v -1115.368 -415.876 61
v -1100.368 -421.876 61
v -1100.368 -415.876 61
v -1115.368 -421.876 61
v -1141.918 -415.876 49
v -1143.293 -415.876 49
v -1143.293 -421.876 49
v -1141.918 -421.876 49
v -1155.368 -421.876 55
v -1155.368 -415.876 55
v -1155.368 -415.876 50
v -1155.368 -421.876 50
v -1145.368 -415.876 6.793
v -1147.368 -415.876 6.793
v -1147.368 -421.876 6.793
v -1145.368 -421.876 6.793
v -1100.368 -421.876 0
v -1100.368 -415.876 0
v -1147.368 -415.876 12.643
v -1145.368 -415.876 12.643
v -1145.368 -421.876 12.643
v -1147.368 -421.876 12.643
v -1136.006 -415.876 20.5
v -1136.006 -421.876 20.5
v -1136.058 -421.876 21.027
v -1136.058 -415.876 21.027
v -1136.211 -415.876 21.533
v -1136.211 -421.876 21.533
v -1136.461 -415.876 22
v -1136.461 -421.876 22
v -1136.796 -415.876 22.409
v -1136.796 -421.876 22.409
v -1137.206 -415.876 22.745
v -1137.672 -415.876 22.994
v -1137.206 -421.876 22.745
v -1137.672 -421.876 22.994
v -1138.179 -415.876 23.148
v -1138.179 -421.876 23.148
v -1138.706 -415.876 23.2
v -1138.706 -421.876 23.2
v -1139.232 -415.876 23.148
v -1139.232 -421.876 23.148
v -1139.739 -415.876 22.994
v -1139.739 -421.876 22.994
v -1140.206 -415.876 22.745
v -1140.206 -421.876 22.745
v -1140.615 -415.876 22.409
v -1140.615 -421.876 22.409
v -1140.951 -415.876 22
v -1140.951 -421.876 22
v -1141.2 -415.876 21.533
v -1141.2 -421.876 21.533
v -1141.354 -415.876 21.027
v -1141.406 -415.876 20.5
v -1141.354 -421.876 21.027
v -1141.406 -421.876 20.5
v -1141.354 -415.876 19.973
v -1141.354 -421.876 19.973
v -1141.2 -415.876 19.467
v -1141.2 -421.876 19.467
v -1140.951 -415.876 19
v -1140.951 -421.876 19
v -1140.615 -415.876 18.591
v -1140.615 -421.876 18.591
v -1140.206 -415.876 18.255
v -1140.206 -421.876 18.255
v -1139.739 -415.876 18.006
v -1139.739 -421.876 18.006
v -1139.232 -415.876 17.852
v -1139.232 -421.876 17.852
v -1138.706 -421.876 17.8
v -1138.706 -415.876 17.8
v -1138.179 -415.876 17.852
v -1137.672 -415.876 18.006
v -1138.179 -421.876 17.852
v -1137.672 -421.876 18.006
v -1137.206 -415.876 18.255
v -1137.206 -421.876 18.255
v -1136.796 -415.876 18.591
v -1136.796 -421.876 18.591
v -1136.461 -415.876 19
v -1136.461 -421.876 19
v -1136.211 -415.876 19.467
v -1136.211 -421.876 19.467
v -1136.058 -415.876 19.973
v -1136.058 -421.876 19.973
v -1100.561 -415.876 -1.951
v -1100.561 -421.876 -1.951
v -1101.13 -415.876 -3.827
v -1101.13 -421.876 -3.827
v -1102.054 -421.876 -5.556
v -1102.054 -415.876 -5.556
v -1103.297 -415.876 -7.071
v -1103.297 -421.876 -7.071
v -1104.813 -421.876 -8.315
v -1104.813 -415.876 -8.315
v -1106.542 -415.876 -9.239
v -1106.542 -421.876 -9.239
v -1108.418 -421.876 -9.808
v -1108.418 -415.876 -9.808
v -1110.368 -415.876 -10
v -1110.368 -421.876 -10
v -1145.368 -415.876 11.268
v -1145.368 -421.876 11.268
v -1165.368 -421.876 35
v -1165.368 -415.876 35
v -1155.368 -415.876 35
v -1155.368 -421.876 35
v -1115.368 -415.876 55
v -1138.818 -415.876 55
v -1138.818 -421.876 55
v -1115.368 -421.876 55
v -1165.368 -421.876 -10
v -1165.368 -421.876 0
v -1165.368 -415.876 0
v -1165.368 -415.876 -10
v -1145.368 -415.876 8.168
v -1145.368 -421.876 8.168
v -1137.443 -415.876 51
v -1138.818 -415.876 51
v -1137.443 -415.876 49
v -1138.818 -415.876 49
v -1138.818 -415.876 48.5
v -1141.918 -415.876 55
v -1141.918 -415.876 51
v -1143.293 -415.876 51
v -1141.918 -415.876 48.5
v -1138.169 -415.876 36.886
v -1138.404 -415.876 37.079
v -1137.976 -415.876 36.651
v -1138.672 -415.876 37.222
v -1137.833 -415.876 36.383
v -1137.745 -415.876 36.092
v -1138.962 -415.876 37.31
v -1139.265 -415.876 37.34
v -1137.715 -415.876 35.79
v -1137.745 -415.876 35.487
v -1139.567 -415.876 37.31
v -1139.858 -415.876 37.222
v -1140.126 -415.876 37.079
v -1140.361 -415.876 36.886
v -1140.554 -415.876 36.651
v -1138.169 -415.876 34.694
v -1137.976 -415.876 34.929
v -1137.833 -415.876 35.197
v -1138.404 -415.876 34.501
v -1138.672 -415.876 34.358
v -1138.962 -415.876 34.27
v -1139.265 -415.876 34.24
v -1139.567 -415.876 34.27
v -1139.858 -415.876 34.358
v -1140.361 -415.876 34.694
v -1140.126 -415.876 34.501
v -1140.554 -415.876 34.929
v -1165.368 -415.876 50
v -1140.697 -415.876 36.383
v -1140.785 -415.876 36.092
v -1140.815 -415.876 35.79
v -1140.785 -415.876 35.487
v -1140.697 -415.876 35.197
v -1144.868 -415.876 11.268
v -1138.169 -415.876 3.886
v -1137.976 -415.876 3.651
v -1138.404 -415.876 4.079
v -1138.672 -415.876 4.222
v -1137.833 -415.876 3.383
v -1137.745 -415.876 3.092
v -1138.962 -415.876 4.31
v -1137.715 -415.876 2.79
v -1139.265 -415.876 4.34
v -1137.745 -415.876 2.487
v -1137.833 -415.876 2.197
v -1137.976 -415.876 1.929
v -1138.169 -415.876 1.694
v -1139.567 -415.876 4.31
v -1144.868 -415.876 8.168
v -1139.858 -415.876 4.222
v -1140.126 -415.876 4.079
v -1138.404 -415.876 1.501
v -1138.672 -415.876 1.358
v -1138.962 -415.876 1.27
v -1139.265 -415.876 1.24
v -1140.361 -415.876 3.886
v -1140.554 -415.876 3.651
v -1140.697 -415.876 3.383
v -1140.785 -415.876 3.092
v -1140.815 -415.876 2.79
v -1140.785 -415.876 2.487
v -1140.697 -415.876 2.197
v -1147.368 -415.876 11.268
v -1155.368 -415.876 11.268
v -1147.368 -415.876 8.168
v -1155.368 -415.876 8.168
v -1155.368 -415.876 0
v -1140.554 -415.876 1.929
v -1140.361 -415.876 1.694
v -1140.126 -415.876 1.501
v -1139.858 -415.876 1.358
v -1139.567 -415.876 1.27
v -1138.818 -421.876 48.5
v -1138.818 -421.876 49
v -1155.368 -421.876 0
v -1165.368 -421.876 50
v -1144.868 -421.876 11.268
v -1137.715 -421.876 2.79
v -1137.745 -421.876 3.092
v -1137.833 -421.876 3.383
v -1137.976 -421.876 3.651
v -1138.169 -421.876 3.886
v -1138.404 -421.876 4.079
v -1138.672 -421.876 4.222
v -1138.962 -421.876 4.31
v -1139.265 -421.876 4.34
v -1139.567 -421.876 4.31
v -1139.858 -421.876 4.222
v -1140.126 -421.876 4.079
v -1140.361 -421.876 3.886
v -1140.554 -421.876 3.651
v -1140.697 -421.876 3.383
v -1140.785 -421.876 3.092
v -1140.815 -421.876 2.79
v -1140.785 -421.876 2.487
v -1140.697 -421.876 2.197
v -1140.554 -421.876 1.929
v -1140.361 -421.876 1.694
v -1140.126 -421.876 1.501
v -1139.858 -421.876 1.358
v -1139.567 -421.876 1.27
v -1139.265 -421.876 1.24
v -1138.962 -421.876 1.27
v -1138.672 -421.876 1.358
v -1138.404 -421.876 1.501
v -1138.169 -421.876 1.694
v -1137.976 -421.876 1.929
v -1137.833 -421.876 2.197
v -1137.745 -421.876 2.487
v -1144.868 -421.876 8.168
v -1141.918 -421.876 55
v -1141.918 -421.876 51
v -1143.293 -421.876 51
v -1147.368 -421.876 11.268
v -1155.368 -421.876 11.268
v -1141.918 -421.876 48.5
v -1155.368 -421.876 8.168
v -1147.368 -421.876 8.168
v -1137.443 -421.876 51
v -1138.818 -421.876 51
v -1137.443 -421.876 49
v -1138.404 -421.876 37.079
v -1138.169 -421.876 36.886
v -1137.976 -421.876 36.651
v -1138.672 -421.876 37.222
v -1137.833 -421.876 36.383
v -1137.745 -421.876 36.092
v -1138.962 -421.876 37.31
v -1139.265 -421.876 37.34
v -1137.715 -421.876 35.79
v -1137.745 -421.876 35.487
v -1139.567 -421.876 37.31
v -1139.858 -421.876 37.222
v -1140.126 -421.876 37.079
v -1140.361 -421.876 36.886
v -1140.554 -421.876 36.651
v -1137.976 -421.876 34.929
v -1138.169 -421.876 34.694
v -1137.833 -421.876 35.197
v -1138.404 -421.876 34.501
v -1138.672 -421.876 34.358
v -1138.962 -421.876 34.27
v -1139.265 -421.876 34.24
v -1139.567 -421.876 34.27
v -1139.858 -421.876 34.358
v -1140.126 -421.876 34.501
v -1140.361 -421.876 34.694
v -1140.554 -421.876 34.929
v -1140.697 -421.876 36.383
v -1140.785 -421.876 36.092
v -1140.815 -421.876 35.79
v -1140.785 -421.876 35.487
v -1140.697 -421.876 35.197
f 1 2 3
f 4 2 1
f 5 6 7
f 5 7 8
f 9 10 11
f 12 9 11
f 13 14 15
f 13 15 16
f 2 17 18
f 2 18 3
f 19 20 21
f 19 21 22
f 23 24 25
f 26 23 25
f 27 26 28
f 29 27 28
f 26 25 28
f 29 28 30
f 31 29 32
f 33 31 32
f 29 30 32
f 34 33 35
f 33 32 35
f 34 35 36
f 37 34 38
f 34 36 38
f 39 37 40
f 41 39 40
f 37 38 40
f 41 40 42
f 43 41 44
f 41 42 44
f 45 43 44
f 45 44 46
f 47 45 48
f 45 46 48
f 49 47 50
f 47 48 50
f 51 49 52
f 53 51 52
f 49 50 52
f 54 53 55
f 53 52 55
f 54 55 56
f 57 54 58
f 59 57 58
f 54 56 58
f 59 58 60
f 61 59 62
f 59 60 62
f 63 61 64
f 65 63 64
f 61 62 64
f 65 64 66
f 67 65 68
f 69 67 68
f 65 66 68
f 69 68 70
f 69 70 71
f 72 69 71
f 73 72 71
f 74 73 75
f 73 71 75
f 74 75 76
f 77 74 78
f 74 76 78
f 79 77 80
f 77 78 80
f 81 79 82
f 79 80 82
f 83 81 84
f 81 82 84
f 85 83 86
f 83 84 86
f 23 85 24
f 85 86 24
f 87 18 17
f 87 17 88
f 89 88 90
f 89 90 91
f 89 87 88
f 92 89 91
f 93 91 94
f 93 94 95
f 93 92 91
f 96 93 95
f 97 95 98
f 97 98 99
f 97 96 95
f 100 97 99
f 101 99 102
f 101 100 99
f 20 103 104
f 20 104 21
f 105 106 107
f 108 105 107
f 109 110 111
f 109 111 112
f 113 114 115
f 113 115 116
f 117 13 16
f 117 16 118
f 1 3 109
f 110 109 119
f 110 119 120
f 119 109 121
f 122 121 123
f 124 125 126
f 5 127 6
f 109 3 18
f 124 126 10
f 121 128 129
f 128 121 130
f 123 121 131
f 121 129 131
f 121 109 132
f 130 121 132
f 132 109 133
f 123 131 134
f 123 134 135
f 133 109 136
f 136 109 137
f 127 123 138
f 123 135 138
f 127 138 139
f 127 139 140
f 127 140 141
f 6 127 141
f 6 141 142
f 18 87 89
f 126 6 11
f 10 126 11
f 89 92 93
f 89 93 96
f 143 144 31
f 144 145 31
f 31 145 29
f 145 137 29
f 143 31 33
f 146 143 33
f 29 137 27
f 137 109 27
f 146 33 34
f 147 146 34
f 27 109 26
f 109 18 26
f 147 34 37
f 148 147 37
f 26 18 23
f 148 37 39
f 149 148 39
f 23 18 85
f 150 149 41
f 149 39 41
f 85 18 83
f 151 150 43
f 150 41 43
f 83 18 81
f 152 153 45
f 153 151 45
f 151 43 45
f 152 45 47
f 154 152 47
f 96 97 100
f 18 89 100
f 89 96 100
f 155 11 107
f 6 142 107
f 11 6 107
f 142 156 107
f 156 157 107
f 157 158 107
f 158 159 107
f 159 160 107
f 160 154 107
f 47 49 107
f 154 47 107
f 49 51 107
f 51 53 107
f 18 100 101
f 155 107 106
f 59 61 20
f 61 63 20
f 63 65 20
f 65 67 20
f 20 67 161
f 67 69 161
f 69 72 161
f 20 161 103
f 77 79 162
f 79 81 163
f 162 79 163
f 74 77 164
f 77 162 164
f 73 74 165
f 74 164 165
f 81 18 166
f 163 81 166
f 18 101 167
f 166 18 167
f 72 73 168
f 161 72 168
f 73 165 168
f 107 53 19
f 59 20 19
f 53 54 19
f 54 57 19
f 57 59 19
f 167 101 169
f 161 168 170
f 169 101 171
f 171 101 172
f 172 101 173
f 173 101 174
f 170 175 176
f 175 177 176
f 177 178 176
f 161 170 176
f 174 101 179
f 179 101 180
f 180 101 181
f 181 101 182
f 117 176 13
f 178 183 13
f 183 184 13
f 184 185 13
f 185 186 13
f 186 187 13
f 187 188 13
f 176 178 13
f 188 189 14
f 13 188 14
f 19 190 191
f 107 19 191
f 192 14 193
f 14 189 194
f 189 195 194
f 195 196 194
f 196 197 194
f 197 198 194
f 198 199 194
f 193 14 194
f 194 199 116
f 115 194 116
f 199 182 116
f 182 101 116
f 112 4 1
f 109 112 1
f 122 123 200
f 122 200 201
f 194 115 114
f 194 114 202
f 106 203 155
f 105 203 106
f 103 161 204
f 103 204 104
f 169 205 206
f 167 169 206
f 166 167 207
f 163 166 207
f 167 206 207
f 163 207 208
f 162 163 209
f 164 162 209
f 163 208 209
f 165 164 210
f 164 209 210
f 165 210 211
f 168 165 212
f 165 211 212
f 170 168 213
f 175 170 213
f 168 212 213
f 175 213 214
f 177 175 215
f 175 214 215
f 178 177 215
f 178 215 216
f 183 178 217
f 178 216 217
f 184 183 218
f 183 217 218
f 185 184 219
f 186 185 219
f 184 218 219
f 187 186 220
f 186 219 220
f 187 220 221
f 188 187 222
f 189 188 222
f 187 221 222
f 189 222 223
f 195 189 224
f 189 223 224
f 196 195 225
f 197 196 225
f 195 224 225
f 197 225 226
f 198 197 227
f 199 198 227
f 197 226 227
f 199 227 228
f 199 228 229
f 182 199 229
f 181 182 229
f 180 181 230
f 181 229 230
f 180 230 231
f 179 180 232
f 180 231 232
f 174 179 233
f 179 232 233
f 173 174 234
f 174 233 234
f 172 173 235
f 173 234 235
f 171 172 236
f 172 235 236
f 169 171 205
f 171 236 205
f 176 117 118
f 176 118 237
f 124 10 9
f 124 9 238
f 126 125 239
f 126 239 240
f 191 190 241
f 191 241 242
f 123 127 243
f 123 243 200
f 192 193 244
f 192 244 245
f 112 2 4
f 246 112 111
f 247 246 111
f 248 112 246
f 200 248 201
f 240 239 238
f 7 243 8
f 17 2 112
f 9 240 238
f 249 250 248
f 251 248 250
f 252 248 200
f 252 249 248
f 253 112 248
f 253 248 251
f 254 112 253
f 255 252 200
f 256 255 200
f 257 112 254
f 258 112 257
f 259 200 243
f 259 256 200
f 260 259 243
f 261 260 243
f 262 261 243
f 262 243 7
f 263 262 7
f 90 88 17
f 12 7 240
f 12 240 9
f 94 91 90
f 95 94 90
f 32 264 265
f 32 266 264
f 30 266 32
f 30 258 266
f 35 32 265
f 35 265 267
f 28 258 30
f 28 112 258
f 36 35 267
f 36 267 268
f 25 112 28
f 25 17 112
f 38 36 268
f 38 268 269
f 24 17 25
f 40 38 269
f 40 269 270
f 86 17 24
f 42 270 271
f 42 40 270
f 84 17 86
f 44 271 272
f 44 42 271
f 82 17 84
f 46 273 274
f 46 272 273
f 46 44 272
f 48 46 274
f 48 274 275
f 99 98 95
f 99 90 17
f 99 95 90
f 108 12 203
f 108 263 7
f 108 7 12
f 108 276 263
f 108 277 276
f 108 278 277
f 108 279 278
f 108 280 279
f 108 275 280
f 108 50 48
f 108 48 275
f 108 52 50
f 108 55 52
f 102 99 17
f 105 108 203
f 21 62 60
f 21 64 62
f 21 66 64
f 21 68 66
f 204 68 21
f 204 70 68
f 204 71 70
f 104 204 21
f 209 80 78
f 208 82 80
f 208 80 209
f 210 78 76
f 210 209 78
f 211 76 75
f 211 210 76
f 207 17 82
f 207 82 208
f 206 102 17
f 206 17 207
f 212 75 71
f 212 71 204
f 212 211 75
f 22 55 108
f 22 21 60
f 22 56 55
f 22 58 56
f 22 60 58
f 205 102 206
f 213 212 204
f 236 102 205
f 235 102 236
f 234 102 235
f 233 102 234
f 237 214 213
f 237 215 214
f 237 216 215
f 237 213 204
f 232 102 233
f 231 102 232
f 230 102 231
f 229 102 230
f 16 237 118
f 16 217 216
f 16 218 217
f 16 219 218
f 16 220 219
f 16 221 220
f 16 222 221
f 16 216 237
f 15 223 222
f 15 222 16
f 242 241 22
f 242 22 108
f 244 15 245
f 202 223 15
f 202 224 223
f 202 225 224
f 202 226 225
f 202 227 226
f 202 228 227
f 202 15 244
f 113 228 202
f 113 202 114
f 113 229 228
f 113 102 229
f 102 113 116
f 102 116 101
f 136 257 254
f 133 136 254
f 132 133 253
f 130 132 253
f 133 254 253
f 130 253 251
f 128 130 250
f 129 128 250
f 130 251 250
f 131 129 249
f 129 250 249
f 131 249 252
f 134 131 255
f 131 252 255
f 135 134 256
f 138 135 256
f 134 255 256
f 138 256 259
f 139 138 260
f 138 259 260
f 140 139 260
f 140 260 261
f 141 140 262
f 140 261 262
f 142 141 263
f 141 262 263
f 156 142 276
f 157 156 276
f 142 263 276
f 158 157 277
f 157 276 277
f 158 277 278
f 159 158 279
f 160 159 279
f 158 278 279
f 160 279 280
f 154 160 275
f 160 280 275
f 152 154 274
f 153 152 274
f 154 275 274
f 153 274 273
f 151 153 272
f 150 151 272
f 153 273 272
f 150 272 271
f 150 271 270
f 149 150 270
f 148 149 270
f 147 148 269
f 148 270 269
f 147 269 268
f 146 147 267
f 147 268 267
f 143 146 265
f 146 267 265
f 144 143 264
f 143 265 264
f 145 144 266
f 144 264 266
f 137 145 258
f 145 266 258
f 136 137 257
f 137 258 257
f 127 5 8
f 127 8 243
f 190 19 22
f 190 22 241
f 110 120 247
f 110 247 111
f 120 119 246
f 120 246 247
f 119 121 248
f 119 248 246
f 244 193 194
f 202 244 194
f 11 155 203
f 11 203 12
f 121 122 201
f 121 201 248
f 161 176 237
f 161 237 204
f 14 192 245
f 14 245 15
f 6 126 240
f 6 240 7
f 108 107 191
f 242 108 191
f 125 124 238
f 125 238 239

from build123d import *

# Parameters (mm, degrees)
DODANIE_WYCI_GNI_CIE2_DEPTH      = 3
DODANIE_WYCI_GNI_CIE2_DEPTH_BACK = 3
SZKIC2_W                         = 50
SZKIC2_H                         = 6
WYTNIJ_WYCI_GNI_CIE1_DEPTH       = 6
WYTNIJ_WYCI_GNI_CIE2_DEPTH       = 6
SZKIC4_W                         = 10
SZKIC4_H                         = 35
SZKIC4_H_2                       = 5
WYTNIJ_WYCI_GNI_CIE3_DEPTH       = 6
WYTNIJ_WYCI_GNI_CIE4_DEPTH       = 6
DODANIE_WYCI_GNI_CIE3_DEPTH      = 6
SZKIC8_R                         = 1.55
SZKIC8_R_2                       = 2.7
WYTNIJ_WYCI_GNI_CIE5_DEPTH       = 6


with BuildPart() as part:
    # Szkic1 → Dodanie-wyciągnięcie2 (new, two sides: drawn at the far end of the back side and taken through both)
    with BuildSketch(Plane(origin=(0, -418.87633849, -418.87633849), x_dir=(1, 0, 0), z_dir=(0, 1, 0)).offset(-DODANIE_WYCI_GNI_CIE2_DEPTH_BACK)):
        Polygon((-1165.368459045, -408.87633849), (-1142.368459045, -408.87633849), (-1142.368459045, -459.87633849), (-1100.368459045, -459.87633849), (-1100.368459045, -479.87633849), (-1165.368459045, -479.87633849), align=None)
    extrude(amount=DODANIE_WYCI_GNI_CIE2_DEPTH + DODANIE_WYCI_GNI_CIE2_DEPTH_BACK)

    # Szkic2 → Wytnij-wyciągnięcie1 (cut)
    with BuildSketch(Plane.XY.offset(61)):
        with Locations((-1140.368459045, -418.87633849)):
            Rectangle(SZKIC2_W, SZKIC2_H)
    extrude(amount=-WYTNIJ_WYCI_GNI_CIE1_DEPTH, mode=Mode.SUBTRACT)

    # Szkic3 → Wytnij-wyciągnięcie2 (cut)
    with BuildSketch(Plane(origin=(0, -415.87633849, 0), x_dir=(1, 0, 0), z_dir=(0, 1, 0))):
        Polygon((-1138.818459045, -55), (-1141.918459045, -55), (-1141.918459045, -51), (-1143.293459045, -51), (-1143.293459045, -49), (-1141.918459045, -49), (-1141.918459045, -48.5), (-1138.818459045, -48.5), (-1138.818459045, -49), (-1137.443459045, -49), (-1137.443459045, -51), (-1138.818459045, -51), align=None)
    extrude(amount=-WYTNIJ_WYCI_GNI_CIE2_DEPTH, mode=Mode.SUBTRACT)

    # Szkic4 → Wytnij-wyciągnięcie3 (cut)
    with BuildSketch(Plane(origin=(0, -415.87633849, 0), x_dir=(1, 0, 0), z_dir=(0, 1, 0))):
        with Locations((-1160.368459045, -17.5)):
            Rectangle(SZKIC4_W, SZKIC4_H)
        with Locations((-1160.368459045, -52.5)):
            Rectangle(SZKIC4_W, SZKIC4_H_2)
    extrude(amount=-WYTNIJ_WYCI_GNI_CIE3_DEPTH, mode=Mode.SUBTRACT)

    # Szkic5 → Wytnij-wyciągnięcie4 (cut)
    with BuildSketch(Plane(origin=(0, -415.87633849, 0), x_dir=(1, 0, 0), z_dir=(0, 1, 0))):
        Polygon((-1155.368459045, -8.168218351), (-1147.368459045, -8.168218351), (-1147.368459045, -6.793218351), (-1145.368459045, -6.793218351), (-1145.368459045, -8.168218351), (-1144.868459045, -8.168218351), (-1144.868459045, -11.268218351), (-1145.368459045, -11.268218351), (-1145.368459045, -12.643218351), (-1147.368459045, -12.643218351), (-1147.368459045, -11.268218351), (-1155.368459045, -11.268218351), align=None)
    extrude(amount=-WYTNIJ_WYCI_GNI_CIE4_DEPTH, mode=Mode.SUBTRACT)


with BuildPart() as body_2:
    # Szkic9 → Dodanie-wyciągnięcie3 (new body)
    with BuildSketch(Plane(origin=(0, -415.87633849, 0), x_dir=(1, 0, 0), z_dir=(0, 1, 0))):
        with BuildLine():
            Line((-1142.368459045, 10), (-1142.368459045, -41))
            Line((-1142.368459045, -41), (-1100.368459045, -41))
            Line((-1100.368459045, -41), (-1100.368459045, 0))
            ThreePointArc((-1100.368459045, 0), (-1103.297391233, 7.071067812), (-1110.368459045, 10))
            Line((-1110.368459045, 10), (-1142.368459045, 10))
        make_face()
    extrude(amount=-DODANIE_WYCI_GNI_CIE3_DEPTH)

    # Połącz3: union part
    add(part.part)

    # Szkic8 → Wytnij-wyciągnięcie5 (cut)
    with BuildSketch(Plane.XZ.offset(421.87633849)):
        with Locations((-1139.26479978, 35.789778966)):
            Circle(SZKIC8_R)
        with Locations((-1139.26479978, 2.789778966)):
            Circle(SZKIC8_R)
        with Locations((-1138.705640448, 20.5)):
            Circle(SZKIC8_R_2)
    extrude(amount=-WYTNIJ_WYCI_GNI_CIE5_DEPTH, mode=Mode.SUBTRACT)


solid = body_2.part
